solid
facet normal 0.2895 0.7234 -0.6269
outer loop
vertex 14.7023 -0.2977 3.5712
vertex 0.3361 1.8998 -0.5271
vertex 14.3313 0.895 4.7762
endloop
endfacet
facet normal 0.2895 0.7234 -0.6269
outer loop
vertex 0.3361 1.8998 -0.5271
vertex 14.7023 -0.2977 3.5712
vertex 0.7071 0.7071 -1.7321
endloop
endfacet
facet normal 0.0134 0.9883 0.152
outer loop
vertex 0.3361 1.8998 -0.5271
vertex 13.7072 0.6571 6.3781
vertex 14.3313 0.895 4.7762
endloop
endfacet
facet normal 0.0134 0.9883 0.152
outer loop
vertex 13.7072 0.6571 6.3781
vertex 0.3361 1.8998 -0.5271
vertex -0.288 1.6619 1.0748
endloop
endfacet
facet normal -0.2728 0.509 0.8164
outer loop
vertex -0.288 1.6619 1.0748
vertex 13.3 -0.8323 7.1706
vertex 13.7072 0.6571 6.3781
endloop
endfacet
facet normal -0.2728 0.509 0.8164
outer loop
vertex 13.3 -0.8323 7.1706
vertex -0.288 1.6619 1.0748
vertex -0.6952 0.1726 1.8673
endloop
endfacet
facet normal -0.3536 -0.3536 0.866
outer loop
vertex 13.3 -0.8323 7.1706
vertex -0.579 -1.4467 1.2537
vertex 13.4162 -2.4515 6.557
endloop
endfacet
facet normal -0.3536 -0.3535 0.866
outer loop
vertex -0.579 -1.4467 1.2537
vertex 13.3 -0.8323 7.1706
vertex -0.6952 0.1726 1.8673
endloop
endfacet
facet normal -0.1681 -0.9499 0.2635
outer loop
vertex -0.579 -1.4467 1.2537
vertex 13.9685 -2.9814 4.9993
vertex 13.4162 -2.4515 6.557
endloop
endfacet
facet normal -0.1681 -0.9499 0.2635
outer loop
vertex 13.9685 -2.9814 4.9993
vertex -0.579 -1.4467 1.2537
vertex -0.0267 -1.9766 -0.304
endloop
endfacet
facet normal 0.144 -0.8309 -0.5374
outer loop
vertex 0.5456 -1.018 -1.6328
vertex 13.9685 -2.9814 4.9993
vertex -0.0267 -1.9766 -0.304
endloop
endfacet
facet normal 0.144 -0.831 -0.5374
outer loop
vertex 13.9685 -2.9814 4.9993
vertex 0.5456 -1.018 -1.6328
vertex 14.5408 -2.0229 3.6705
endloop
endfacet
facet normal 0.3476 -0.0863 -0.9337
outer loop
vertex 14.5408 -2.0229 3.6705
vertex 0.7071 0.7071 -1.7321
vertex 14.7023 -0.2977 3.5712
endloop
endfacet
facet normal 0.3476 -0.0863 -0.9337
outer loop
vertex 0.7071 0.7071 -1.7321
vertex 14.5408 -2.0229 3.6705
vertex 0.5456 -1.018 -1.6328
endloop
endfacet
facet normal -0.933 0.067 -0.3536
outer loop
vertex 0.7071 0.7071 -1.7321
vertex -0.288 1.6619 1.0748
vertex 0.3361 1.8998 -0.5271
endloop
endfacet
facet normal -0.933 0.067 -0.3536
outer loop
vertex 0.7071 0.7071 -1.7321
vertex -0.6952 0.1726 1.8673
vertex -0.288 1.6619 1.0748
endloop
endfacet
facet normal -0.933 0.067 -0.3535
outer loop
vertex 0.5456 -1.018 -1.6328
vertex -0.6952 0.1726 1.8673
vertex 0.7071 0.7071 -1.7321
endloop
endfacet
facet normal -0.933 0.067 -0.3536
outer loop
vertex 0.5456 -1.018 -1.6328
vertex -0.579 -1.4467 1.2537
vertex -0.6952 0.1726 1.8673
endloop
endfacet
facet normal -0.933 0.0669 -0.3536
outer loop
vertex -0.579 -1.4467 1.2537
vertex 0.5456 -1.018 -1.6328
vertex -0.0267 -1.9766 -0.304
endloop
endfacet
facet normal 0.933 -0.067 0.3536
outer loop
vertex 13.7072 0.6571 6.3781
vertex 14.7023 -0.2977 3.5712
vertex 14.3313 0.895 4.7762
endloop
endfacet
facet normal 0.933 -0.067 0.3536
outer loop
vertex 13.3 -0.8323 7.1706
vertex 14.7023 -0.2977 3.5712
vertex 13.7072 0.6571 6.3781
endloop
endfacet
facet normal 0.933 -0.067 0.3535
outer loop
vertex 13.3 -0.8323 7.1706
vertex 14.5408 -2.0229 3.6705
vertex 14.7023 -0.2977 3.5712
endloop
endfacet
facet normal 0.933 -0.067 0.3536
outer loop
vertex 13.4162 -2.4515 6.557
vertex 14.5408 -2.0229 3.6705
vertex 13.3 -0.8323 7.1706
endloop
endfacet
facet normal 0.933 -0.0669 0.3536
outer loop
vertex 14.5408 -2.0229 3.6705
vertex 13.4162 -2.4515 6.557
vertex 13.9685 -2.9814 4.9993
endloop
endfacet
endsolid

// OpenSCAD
// Generated by generate_scads.py
rotate([45,60,45]) {
  cylinder(h=15, r=2, center=false);
}
